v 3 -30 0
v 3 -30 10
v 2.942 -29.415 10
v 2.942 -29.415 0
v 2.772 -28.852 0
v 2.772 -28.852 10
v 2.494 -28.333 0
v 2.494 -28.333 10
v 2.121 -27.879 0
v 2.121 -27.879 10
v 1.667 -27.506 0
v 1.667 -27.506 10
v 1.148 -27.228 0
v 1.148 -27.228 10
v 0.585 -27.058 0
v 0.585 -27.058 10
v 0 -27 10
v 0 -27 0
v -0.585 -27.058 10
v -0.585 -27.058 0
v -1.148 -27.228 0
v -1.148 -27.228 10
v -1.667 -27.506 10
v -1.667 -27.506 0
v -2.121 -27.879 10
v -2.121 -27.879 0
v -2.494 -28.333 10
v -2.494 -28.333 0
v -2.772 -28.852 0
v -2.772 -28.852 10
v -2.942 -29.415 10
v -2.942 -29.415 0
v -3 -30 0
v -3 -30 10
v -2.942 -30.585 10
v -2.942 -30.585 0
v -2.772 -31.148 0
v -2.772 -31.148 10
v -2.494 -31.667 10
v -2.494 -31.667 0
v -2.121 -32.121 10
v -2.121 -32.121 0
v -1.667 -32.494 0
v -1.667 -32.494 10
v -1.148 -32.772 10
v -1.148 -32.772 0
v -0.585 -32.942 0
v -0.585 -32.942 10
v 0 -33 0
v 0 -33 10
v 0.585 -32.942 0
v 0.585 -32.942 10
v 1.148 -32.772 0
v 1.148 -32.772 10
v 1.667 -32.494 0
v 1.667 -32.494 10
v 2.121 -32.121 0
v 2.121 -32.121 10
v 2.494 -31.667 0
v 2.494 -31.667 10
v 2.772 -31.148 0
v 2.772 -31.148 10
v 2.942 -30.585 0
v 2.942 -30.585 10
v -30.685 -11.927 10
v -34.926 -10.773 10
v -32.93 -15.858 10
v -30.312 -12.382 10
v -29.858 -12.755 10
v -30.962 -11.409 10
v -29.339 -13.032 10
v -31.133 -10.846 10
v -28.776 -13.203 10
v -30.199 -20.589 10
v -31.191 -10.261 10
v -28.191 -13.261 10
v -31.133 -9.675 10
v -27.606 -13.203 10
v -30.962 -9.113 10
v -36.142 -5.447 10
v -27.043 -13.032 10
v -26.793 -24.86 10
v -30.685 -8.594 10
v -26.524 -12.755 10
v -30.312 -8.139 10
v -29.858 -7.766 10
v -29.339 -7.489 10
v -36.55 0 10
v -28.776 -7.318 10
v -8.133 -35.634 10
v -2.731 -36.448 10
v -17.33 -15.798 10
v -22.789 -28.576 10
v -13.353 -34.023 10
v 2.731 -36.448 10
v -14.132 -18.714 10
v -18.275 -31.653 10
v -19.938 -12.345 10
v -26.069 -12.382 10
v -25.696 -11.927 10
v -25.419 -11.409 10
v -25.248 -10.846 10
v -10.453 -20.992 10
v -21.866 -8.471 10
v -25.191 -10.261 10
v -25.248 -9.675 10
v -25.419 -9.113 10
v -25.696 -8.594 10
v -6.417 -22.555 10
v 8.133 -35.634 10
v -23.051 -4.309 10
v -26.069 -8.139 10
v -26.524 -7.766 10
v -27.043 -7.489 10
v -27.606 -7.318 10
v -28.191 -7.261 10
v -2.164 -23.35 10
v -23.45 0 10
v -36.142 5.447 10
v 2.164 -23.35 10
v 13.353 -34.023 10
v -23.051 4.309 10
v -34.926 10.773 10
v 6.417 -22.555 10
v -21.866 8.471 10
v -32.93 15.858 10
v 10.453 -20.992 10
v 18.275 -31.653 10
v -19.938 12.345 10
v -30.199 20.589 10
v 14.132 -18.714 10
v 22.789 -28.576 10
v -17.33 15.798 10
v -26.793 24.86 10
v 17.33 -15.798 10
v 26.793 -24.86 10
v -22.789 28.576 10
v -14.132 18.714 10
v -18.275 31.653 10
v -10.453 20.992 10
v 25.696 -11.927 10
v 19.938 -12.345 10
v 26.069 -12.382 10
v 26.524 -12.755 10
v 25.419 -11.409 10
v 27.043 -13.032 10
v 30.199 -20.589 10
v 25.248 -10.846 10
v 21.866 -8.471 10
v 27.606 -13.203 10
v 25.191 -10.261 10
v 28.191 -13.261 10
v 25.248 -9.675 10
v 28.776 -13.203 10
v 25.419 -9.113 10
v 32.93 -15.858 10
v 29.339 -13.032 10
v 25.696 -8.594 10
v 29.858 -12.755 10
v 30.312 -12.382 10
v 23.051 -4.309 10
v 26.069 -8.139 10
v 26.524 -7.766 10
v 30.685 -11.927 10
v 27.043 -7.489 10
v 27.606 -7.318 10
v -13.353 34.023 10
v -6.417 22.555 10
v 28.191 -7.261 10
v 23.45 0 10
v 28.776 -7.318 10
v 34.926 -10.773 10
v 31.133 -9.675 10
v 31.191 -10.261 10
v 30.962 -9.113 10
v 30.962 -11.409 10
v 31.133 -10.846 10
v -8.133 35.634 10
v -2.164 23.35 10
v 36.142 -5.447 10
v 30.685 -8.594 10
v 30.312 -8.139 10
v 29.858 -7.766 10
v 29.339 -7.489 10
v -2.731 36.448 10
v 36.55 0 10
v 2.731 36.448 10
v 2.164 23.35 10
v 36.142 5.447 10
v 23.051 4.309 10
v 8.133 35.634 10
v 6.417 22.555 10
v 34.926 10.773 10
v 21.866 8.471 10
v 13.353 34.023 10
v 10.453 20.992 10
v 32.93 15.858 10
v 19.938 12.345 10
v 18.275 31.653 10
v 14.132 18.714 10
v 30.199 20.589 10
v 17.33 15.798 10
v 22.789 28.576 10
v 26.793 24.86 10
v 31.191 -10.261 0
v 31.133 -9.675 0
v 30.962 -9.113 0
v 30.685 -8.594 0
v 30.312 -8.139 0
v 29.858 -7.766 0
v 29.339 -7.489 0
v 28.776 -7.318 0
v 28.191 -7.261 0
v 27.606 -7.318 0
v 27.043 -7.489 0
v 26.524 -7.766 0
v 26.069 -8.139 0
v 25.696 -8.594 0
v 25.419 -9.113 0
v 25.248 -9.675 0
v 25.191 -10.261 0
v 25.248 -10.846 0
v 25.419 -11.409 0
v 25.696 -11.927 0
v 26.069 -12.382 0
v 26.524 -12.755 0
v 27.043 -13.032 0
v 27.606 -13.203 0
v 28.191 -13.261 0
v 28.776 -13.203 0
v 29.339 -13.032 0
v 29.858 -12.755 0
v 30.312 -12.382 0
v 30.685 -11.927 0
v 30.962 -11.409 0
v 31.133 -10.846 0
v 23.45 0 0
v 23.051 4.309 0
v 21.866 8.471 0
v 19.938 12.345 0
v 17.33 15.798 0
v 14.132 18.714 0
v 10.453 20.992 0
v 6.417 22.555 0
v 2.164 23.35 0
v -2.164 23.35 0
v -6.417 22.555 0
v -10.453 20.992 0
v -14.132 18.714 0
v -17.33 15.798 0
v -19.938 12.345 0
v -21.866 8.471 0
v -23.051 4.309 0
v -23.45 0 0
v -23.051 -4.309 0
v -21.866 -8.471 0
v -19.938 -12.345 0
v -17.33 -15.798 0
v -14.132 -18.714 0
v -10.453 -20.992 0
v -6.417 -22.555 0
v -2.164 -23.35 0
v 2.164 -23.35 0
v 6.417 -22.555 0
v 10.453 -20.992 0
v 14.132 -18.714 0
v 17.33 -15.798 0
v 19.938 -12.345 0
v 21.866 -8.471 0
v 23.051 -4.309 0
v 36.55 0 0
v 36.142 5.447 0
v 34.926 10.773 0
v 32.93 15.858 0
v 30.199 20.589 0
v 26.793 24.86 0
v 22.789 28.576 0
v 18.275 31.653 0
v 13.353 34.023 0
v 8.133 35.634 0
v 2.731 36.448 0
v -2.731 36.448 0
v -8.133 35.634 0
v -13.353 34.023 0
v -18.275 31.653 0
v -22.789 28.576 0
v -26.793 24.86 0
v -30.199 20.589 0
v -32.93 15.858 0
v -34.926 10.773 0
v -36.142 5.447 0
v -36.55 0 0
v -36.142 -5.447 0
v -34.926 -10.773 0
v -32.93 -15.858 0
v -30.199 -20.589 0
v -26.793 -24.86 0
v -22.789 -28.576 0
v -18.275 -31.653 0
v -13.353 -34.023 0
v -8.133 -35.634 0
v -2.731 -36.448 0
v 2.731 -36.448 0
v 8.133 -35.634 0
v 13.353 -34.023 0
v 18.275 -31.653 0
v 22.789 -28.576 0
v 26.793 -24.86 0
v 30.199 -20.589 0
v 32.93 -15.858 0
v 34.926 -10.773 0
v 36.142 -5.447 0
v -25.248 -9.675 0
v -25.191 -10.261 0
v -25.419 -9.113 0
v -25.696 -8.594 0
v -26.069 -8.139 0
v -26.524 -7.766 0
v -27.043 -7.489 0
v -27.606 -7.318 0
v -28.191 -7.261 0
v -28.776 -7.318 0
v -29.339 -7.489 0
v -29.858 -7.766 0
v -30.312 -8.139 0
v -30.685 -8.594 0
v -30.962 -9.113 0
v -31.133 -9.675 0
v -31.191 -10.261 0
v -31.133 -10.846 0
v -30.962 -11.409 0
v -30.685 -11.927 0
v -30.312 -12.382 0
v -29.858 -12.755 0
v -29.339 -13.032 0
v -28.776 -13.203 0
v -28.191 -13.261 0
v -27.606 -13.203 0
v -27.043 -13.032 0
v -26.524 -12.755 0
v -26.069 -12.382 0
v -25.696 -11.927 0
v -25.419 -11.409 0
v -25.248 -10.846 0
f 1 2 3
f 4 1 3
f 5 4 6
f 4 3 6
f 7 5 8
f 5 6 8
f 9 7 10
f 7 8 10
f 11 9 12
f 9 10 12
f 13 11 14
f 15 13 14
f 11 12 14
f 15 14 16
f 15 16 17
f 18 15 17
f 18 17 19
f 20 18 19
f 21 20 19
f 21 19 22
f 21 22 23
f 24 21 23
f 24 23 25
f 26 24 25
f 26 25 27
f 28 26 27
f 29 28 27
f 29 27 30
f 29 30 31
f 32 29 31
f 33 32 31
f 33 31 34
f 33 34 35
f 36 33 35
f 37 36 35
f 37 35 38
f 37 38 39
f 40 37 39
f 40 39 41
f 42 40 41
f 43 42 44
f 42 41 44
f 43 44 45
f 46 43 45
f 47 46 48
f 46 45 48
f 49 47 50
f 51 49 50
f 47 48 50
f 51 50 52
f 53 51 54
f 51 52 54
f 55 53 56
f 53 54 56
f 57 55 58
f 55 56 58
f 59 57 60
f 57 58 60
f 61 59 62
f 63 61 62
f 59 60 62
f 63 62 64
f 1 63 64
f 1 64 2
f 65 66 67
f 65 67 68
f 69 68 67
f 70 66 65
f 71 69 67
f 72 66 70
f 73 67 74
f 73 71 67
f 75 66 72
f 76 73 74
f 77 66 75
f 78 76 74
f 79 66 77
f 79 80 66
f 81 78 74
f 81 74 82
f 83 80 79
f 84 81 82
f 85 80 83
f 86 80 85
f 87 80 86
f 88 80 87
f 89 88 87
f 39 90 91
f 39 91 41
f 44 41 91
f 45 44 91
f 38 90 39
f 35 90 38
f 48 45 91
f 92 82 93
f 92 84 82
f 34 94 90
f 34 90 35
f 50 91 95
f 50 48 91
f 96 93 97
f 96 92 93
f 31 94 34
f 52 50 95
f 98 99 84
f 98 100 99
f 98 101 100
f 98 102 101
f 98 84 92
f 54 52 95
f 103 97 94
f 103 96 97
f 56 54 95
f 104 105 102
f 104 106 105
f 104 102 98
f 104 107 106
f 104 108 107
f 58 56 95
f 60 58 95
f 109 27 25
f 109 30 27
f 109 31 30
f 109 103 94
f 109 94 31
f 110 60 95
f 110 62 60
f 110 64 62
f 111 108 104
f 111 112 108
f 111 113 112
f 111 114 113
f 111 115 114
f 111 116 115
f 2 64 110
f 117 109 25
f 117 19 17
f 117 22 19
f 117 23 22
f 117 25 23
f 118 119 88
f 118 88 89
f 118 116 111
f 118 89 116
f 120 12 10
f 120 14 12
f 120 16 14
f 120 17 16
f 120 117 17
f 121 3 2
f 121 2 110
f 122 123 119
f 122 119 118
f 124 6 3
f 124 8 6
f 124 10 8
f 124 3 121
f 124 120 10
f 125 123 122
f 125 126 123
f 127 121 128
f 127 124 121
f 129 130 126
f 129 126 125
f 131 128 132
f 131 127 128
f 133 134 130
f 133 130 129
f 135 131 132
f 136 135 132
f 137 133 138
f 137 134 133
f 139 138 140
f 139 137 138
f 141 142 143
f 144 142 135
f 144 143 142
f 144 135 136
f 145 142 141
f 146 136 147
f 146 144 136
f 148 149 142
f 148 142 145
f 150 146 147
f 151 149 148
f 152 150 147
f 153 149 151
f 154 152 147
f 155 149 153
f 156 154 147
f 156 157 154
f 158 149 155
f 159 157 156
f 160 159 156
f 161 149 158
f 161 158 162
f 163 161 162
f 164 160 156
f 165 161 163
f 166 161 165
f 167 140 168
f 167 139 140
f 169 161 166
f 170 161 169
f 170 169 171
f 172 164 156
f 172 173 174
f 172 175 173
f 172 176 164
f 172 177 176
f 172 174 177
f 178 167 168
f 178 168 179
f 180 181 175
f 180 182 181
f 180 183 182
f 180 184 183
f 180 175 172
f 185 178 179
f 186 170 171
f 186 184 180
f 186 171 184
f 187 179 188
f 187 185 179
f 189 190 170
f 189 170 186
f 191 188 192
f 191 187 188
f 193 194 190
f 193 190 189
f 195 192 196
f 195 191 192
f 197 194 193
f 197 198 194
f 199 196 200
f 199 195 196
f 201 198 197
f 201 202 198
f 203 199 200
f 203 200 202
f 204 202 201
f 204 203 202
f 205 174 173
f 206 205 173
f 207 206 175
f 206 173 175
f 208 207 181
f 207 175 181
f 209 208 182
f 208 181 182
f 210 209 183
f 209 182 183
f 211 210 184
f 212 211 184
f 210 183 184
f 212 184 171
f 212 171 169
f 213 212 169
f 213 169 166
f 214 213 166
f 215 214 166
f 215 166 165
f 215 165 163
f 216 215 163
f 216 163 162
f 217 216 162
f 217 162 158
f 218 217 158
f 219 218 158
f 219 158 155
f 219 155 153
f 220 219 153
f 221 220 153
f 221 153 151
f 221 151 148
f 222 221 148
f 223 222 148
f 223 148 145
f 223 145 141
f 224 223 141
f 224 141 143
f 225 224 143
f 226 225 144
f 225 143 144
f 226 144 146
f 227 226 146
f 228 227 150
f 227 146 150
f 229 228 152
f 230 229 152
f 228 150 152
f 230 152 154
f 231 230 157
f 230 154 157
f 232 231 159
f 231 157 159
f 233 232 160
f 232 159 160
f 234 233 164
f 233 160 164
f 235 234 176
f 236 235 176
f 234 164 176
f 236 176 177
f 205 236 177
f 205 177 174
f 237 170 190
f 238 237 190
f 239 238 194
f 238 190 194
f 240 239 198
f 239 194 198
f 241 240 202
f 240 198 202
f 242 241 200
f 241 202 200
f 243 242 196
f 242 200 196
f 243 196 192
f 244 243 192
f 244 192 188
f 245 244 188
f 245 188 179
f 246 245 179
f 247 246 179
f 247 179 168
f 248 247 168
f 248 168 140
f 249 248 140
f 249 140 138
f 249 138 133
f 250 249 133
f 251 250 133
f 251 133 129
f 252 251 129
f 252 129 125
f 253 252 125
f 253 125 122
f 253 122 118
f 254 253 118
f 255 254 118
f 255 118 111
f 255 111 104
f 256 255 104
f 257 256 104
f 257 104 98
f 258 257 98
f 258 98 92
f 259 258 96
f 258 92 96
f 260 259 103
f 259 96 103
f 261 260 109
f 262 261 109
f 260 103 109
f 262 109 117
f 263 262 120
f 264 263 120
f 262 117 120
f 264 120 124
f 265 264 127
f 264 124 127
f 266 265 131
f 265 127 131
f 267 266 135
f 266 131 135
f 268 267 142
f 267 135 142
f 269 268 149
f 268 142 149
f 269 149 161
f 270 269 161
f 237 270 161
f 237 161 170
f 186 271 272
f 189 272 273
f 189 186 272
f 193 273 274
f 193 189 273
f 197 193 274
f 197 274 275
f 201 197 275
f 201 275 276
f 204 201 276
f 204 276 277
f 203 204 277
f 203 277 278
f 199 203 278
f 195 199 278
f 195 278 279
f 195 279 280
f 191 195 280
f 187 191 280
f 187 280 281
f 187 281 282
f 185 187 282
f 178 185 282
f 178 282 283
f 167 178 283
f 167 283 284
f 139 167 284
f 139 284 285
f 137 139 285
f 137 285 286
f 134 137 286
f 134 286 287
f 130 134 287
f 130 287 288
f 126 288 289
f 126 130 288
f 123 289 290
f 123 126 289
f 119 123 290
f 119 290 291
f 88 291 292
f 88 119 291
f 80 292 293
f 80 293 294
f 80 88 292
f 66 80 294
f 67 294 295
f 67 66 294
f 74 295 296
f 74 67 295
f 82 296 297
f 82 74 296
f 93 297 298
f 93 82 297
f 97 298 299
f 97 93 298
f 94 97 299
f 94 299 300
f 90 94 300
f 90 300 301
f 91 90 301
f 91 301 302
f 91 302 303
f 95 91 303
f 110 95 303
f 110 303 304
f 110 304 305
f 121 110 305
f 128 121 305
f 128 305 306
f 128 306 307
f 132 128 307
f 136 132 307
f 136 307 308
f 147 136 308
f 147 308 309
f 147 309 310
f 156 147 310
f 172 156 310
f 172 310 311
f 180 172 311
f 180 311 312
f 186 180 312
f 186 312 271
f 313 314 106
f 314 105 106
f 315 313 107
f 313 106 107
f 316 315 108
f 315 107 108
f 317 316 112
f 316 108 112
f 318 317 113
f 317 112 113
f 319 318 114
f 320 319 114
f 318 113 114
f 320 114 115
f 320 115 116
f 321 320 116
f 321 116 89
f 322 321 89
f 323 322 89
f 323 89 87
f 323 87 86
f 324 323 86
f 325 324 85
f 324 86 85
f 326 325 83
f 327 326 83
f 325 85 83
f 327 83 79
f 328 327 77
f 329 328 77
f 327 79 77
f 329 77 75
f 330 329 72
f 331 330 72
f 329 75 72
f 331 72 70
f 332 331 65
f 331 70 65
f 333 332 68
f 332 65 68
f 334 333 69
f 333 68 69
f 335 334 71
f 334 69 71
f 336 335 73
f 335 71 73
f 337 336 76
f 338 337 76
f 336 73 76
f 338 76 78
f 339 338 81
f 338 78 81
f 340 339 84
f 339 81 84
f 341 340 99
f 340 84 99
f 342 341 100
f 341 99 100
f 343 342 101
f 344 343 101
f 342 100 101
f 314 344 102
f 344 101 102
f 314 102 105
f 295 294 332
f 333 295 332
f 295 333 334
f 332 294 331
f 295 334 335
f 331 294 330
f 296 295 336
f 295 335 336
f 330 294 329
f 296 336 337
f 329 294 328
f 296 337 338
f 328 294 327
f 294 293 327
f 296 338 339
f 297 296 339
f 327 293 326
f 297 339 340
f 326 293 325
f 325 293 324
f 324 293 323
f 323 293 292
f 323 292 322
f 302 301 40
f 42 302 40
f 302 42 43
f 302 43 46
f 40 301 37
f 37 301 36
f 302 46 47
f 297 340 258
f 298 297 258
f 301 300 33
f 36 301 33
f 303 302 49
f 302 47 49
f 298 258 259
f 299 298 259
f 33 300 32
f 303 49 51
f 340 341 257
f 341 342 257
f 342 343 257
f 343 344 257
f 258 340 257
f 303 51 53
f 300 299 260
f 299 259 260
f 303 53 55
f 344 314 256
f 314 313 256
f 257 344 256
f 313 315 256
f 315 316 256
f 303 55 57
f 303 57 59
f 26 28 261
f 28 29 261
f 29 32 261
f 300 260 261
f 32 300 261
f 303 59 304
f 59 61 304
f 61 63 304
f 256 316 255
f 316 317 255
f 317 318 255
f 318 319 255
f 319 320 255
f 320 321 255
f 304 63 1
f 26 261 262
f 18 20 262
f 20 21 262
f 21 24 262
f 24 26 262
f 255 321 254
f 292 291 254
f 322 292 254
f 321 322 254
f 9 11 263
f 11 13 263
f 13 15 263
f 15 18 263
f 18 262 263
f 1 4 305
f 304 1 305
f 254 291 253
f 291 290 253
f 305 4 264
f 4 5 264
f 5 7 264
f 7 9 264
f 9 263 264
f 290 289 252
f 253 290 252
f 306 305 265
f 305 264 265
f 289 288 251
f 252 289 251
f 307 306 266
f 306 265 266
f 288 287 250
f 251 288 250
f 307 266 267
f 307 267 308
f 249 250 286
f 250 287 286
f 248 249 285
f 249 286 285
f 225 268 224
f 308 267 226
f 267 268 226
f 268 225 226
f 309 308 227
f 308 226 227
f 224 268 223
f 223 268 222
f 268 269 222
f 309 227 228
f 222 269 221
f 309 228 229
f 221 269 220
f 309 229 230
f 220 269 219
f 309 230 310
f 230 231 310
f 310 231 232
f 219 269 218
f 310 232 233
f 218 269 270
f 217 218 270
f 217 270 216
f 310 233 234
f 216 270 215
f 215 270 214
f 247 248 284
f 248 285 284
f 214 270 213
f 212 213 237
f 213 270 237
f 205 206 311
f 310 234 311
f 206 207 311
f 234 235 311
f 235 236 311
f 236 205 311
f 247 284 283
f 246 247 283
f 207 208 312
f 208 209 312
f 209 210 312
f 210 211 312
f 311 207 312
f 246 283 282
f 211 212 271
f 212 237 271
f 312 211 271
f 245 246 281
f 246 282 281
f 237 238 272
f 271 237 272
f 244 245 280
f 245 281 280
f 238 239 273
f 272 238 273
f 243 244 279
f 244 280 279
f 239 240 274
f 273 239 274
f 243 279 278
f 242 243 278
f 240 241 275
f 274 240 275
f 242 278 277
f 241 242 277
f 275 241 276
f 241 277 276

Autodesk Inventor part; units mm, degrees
ref_plane "YZ Plane" through (0, 0, 0) normal (1, 0, 0) x (0, 1, 0)
ref_plane "XZ Plane" through (0, 0, 0) normal (0, 1, 0) x (-1, 0, 0)
ref_plane "XY Plane" through (0, 0, 0) normal (0, 0, 1) x (1, 0, 0)
sketch "スケッチ1" plane through (0, 0, 0) normal (0, 0, 1) x (1, 0, 0)
  arc A0 (-23.45, 0) -> (23.45, 0) centre (0, 0) ccw
  arc A1 (-36.55, 0) -> (36.55, 0) centre (0, 0) ccw
  circle A2 centre (0, -30) radius 2.55
  circle A3 centre (28.1908, -10.2606) radius 2.55
  circle A4 centre (-28.1908, -10.2606) radius 2.55
  line L0 (0, 0) -> (-28.1908, -10.2606) construction
  line L1 (0, 0) -> (28.1908, -10.2606) construction
  line L2 (-48.309, 0) -> (65.7551, 0)
  dimension "d0" = 46.9
  dimension "d1" = 73.1
  dimension "d2" = 5.1
  dimension "d3" = 5.1
  dimension "d4" = 5.1
  dimension "d5" = 30
  dimension "d6" = 30
  dimension "d7" = 30
  dimension "d9" = 20
  dimension "d10" = 20
extrude "押し出し1" add sketch "スケッチ1" along normal blind 10 contours A0 L2 A1
fillet "フィレット1" radius 2 4 edges at (36.55, 0, 5) (23.45, 0, 5) (-23.45, 0, 5) (-36.55, 0, 5)
sketch "スケッチ3" plane through (0, 0, 10) normal (0, 0, 1) x (1, 0, 0)
  circle A0 centre (0, 0) radius 23.45
  circle A1 centre (0, 0) radius 36.55
  circle A2 centre (28.1908, -10.2606) radius 2.55 projected
  circle A3 centre (28.1908, -10.2606) radius 2.55
  circle A4 centre (0, -30) radius 2.55 projected
  circle A5 centre (0, -30) radius 2.55
  circle A6 centre (-28.1908, -10.2606) radius 2.55 projected
  circle A7 centre (-28.1908, -10.2606) radius 2.55
extrude "押し出し3" add sketch "スケッチ3" against normal blind 10
sketch "スケッチ5" plane through (0, 0, 10) normal (0, 0, 1) x (1, 0, 0)
  circle A0 centre (-28.1908, -10.2606) radius 2.55 projected
  circle A1 centre (-28.1908, -10.2606) radius 3
  circle A2 centre (0, -30) radius 2.55 projected
  circle A3 centre (0, -30) radius 3
  circle A4 centre (28.1908, -10.2606) radius 2.55 projected
  circle A5 centre (28.1908, -10.2606) radius 3
  point P0 (0, 0)
  dimension "d22" = 6
  dimension "d23" = 6
  dimension "d24" = 6
extrude "押し出し5" cut sketch "スケッチ5" against normal through all
properties part number "半円 穴あり"
